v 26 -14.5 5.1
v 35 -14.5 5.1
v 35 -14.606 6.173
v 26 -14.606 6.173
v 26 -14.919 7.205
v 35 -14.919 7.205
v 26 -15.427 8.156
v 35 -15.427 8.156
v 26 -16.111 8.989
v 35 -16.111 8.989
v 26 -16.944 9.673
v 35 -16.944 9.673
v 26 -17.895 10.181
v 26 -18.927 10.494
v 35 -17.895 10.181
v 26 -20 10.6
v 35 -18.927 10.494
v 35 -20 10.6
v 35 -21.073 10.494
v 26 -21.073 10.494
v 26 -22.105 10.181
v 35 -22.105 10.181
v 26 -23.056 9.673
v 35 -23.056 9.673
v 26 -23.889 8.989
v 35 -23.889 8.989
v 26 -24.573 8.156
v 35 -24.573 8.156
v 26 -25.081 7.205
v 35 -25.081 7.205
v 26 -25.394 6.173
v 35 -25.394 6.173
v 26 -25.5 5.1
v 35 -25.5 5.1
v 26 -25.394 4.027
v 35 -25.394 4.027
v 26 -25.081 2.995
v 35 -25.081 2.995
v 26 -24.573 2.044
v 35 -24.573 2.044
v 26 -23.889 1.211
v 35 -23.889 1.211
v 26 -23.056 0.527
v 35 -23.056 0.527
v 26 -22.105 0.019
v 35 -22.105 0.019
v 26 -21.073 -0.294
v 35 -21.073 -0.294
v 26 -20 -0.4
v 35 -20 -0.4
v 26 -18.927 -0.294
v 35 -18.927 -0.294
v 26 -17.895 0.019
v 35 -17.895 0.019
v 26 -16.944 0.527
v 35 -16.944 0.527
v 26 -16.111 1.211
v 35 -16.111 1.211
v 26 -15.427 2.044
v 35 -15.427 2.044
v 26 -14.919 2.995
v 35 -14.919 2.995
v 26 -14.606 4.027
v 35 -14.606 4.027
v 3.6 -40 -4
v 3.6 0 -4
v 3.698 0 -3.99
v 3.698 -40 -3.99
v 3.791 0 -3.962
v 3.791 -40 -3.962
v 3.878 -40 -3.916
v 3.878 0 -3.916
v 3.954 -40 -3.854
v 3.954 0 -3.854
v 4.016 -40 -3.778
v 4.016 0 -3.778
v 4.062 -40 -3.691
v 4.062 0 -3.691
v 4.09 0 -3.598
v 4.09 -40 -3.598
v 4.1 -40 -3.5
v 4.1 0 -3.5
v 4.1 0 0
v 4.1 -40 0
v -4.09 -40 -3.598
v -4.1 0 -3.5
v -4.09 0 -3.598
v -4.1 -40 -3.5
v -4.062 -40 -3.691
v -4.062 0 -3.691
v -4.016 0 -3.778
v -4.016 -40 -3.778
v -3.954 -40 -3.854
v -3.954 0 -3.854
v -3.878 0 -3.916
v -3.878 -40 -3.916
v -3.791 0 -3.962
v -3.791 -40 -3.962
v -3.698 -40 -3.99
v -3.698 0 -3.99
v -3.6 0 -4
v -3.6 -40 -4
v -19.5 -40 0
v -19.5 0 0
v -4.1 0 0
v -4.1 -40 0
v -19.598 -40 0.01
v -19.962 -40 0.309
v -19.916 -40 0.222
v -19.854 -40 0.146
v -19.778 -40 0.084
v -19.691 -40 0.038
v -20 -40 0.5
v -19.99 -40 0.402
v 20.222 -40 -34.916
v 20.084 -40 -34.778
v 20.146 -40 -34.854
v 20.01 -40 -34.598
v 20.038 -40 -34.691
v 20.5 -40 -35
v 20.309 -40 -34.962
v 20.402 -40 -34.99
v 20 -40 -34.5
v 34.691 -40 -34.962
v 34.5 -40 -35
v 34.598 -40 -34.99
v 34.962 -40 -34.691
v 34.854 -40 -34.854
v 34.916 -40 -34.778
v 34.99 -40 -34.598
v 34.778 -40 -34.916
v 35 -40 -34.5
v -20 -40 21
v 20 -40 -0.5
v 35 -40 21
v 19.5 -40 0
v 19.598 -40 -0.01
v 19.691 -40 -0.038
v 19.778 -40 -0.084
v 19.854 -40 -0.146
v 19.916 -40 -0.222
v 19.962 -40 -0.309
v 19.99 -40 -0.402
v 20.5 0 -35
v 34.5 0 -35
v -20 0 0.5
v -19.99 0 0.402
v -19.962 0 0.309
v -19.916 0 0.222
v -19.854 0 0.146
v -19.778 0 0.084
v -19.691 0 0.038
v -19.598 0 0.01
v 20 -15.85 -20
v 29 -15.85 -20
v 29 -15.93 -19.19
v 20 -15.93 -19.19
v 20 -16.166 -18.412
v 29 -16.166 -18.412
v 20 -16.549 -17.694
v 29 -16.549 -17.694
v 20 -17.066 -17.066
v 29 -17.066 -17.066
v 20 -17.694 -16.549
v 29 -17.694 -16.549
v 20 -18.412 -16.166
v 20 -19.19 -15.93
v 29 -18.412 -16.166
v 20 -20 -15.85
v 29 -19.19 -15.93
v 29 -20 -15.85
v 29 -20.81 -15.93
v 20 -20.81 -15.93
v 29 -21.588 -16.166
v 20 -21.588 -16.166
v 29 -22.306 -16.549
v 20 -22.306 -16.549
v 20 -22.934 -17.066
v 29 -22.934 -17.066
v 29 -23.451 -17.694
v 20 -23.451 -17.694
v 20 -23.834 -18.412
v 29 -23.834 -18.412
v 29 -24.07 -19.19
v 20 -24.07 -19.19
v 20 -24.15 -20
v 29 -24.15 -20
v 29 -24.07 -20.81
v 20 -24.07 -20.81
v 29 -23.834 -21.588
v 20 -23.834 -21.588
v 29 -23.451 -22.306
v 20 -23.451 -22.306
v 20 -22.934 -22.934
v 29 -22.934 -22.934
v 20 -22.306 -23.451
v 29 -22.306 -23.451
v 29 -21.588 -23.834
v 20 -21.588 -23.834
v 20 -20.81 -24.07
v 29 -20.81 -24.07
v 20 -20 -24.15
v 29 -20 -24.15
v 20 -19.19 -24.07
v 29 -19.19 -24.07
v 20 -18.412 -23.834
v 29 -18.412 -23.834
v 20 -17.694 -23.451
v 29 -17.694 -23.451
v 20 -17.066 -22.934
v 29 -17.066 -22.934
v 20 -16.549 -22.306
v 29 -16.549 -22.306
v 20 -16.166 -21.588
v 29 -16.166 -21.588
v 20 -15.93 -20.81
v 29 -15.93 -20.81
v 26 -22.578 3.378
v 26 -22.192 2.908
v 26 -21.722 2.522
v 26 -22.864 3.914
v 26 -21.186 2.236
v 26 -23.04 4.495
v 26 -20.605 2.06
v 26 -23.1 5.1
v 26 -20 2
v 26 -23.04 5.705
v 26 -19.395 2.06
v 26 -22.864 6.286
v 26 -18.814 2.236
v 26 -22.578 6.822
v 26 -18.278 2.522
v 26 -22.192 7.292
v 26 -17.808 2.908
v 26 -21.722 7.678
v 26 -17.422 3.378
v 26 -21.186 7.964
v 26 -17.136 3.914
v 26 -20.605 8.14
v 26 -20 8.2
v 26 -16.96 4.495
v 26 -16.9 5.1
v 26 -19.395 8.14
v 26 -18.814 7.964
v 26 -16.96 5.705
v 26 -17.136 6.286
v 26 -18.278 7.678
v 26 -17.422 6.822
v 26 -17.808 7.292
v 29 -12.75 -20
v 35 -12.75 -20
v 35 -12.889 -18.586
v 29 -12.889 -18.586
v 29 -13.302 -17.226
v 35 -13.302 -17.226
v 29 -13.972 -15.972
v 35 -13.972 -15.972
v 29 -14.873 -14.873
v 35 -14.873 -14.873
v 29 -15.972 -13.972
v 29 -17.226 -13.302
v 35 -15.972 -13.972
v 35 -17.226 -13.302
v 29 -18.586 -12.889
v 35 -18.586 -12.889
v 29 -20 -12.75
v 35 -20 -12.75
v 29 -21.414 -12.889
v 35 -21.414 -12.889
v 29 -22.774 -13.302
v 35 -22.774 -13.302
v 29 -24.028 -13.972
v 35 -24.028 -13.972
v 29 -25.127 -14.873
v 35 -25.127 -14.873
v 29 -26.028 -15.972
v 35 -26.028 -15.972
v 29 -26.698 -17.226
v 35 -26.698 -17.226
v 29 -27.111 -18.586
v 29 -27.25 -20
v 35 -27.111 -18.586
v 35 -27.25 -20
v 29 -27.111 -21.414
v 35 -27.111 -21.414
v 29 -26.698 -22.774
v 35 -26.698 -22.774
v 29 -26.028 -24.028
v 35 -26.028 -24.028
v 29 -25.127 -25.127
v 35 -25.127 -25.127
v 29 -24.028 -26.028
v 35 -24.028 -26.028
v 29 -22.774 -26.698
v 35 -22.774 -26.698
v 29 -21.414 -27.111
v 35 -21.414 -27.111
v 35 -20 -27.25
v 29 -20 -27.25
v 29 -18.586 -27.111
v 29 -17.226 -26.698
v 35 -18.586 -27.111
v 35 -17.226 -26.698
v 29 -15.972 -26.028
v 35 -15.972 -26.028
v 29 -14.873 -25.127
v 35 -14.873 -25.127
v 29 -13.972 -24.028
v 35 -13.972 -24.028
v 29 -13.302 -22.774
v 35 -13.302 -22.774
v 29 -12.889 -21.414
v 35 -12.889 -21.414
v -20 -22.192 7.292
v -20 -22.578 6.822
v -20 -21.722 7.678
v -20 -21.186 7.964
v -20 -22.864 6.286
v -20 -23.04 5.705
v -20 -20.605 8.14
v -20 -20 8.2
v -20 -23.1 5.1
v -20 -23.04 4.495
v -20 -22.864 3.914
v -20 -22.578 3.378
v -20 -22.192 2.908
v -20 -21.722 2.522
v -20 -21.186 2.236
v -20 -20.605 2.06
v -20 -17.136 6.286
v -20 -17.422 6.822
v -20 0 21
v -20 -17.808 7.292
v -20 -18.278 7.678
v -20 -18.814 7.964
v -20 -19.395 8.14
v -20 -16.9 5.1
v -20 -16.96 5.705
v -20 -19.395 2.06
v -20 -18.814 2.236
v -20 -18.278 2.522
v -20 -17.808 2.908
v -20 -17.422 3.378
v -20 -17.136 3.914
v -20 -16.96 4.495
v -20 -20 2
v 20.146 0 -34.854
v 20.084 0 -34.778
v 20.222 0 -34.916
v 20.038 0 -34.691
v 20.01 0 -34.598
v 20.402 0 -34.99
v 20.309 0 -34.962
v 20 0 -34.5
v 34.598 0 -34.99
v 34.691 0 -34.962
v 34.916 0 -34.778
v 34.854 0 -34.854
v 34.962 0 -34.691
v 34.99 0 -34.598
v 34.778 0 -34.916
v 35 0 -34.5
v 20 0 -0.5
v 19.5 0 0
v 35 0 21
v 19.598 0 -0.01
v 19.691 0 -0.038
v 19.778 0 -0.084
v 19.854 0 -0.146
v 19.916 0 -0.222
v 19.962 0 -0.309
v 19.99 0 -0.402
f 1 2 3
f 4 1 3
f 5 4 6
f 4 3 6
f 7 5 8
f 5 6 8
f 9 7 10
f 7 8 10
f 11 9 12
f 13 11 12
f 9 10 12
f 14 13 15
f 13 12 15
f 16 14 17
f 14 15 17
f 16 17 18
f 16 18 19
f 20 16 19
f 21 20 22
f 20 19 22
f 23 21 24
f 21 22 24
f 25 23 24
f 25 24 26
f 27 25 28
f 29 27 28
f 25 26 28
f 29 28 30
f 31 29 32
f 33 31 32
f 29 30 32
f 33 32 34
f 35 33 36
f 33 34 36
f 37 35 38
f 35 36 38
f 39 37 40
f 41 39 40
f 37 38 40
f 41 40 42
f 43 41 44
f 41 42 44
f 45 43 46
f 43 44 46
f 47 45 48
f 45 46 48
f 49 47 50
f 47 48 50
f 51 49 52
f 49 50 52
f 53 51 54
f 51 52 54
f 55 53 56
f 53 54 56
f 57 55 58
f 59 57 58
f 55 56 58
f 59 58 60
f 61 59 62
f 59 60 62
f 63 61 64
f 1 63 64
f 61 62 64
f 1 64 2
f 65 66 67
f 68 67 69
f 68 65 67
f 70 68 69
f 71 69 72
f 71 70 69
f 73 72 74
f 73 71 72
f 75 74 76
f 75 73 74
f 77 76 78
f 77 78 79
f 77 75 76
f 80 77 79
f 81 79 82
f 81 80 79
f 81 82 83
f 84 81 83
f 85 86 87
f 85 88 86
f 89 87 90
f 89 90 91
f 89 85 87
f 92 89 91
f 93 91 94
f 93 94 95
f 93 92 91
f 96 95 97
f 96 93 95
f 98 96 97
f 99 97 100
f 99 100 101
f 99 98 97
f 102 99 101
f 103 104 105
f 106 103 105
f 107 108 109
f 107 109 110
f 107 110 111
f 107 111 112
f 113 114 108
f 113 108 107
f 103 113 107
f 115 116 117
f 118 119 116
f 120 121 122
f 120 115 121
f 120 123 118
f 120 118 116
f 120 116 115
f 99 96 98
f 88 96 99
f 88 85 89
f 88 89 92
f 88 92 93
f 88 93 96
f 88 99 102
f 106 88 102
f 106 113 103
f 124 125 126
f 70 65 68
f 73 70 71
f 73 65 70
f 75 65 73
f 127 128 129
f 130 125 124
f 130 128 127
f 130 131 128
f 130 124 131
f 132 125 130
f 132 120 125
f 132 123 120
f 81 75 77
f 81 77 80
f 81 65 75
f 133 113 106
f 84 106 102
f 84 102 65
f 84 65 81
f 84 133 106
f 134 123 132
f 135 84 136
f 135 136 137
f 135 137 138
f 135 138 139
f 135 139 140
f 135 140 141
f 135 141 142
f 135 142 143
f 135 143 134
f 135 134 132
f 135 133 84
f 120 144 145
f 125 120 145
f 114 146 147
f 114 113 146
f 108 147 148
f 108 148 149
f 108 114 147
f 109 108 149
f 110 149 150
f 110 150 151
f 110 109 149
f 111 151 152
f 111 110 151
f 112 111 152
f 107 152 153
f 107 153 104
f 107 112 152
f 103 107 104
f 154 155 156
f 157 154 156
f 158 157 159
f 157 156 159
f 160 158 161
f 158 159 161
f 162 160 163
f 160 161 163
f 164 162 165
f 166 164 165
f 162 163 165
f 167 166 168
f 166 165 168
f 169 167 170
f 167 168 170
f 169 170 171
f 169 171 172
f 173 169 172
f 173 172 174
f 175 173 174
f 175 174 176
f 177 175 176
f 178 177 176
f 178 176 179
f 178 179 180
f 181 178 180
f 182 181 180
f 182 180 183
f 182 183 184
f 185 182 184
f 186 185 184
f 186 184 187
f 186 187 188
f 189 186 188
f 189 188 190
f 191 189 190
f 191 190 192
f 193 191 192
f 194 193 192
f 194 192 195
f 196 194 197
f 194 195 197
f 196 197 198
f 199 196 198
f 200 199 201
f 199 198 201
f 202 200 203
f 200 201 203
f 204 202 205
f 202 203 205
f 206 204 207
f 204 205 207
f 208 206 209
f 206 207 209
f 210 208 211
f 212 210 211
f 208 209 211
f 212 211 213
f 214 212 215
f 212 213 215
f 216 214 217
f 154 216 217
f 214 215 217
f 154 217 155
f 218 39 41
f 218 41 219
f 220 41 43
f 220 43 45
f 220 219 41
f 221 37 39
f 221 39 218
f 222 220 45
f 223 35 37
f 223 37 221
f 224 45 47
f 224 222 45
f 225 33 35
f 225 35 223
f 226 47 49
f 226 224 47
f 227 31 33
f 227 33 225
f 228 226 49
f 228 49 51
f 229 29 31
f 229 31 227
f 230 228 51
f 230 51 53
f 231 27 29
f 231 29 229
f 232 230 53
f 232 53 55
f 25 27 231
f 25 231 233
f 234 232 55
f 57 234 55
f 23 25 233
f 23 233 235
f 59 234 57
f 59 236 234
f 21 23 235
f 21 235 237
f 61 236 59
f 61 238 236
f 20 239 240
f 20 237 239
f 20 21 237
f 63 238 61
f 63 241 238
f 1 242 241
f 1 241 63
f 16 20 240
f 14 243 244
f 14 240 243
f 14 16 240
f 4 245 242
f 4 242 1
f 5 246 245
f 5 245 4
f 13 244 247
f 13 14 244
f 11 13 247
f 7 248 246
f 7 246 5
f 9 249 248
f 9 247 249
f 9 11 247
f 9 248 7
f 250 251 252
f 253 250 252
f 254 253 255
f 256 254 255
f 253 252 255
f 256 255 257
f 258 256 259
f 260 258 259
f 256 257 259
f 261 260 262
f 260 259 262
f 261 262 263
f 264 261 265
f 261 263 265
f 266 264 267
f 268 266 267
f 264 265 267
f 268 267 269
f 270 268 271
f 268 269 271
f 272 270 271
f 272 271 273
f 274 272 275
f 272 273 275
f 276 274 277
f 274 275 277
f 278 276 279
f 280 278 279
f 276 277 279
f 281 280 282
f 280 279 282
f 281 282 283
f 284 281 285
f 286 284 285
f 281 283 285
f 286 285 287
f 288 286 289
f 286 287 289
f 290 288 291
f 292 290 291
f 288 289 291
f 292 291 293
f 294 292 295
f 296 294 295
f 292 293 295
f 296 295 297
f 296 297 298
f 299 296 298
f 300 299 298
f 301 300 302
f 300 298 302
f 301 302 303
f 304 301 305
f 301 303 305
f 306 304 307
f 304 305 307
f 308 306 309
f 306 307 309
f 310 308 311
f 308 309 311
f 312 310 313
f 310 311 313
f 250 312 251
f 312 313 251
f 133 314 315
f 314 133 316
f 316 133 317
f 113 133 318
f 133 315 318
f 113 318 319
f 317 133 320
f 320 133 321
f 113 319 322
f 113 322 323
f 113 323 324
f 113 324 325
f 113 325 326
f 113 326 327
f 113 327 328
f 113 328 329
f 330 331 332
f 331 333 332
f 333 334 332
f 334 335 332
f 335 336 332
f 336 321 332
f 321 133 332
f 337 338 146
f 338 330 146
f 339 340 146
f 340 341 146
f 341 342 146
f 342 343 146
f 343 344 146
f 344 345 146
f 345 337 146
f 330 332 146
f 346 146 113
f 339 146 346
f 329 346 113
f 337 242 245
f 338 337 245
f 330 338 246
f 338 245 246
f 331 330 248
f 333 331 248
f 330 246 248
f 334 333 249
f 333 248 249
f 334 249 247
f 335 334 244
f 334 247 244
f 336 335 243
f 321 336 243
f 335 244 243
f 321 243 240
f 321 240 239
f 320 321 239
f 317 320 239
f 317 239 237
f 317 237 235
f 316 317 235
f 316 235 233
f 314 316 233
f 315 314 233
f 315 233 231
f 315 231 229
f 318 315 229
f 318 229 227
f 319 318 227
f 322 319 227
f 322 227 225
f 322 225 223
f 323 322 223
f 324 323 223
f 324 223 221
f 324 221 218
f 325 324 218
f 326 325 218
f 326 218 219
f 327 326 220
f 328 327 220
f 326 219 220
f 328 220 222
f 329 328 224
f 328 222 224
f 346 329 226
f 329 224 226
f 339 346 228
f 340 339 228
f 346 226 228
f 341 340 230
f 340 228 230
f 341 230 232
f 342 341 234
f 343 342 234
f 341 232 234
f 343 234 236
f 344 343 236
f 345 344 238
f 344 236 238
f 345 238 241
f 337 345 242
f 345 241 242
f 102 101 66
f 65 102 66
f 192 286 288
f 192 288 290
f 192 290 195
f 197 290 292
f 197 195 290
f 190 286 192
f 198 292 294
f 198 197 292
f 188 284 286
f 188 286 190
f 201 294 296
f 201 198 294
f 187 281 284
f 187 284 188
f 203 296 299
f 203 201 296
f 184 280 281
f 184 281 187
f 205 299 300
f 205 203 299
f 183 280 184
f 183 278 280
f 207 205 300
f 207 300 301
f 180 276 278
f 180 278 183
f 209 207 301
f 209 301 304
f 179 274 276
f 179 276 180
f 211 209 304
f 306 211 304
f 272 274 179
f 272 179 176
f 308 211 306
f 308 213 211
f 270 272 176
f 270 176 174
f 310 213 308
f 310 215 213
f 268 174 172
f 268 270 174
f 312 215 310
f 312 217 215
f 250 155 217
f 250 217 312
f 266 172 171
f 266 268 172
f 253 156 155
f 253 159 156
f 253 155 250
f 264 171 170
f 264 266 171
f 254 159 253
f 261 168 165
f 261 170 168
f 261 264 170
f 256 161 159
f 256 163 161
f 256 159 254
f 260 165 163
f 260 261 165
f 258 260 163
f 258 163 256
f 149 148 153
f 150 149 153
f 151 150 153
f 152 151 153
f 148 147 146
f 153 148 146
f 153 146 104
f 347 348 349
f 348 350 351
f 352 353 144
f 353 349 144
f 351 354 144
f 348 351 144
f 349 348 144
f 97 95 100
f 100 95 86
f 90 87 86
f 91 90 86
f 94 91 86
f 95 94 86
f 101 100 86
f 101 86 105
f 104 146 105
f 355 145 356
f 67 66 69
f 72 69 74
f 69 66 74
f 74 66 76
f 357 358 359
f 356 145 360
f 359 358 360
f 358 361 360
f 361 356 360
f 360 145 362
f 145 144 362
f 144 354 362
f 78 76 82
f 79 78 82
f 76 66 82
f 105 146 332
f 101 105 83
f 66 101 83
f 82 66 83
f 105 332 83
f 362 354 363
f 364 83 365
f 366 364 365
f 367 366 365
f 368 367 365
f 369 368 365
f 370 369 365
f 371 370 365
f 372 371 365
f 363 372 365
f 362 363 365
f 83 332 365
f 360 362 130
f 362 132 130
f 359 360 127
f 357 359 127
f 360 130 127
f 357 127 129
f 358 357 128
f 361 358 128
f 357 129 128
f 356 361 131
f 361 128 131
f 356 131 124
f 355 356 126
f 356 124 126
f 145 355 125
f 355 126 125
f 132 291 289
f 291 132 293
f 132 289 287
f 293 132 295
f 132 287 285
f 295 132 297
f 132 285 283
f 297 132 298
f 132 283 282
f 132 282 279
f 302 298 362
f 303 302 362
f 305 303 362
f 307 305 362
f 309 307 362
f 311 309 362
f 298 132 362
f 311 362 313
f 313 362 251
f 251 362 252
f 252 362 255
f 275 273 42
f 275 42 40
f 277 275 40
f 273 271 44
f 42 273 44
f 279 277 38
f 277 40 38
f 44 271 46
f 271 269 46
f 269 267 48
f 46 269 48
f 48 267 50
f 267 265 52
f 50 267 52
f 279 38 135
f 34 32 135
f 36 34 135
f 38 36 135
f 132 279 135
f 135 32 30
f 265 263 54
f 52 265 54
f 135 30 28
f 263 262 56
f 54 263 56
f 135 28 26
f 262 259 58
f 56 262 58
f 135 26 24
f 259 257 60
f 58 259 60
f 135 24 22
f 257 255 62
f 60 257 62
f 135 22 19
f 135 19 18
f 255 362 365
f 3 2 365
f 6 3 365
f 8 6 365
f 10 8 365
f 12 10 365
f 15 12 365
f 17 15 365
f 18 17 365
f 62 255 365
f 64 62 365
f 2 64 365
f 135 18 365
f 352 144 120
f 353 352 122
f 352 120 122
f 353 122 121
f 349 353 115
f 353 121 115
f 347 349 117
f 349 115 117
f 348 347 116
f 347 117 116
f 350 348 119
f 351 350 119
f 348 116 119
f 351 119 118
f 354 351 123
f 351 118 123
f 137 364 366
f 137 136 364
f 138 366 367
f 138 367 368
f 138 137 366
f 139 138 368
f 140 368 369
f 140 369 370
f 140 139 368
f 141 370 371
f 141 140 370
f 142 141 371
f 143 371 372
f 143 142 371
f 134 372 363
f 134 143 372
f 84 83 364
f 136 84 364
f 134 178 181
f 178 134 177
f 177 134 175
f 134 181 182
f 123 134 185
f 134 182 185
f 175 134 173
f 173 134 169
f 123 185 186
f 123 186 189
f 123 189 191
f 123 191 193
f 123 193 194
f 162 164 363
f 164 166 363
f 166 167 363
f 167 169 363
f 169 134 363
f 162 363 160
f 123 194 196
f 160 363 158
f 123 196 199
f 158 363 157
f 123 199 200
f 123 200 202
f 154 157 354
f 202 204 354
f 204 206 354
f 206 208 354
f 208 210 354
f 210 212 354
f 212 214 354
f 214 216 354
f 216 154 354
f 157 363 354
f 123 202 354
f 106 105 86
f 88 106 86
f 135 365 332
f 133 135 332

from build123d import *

# Parameters (mm, degrees)
F1_DEPTH = 40
F2_R     = 4.15
F2_R_2   = 3.1
F3_DEPTH = 55.001
F4_R     = 0.5
F2_R_3   = 7.25
F5_DEPTH = 6
F2_R_4   = 5.5
F6_DEPTH = 9


with BuildPart() as f1:
    # F0 (on Front) → F1 (new body)
    with BuildSketch(Plane.XZ):
        Polygon((35, 21), (-20, 21), (-20, 0), (-4.1, 0), (-4.1, -4), (4.1, -4), (4.1, 0), (20, 0), (20, -35), (35, -35), align=None)
    extrude(amount=F1_DEPTH)

    # F2 (on face) → F3 (cut, through all)
    with BuildSketch(Plane.YZ.offset(35)):
        with Locations((-20, -20)):
            Circle(F2_R)
        with Locations((-20, 5.1)):
            Circle(F2_R_2)
    extrude(amount=-F3_DEPTH, mode=Mode.SUBTRACT)

    # F4
    f4_edges = [f1.edges().sort_by_distance(p)[0] for p in [
        (-20, -20, 0),
        (-4.1, -20, -4),
        (4.1, -20, -4),
        (20, -20, 0),
        (20, -20, -35),
        (35, -20, -35),
    ]]
    fillet(f4_edges, radius=F4_R)

    # F2 (on face) → F5 (cut)
    with BuildSketch(Plane.YZ.offset(35)):
        with Locations((-20, -20)):
            Circle(F2_R_3)
        with Locations((-20, -20)):
            Circle(F2_R, mode=Mode.SUBTRACT)
    extrude(amount=-F5_DEPTH, mode=Mode.SUBTRACT)

    # F2 (on face) → F6 (cut)
    with BuildSketch(Plane.YZ.offset(35)):
        with Locations((-20, 5.1)):
            Circle(F2_R_4)
        with Locations((-20, 5.1)):
            Circle(F2_R_2, mode=Mode.SUBTRACT)
    extrude(amount=-F6_DEPTH, mode=Mode.SUBTRACT)


solid = f1.part
